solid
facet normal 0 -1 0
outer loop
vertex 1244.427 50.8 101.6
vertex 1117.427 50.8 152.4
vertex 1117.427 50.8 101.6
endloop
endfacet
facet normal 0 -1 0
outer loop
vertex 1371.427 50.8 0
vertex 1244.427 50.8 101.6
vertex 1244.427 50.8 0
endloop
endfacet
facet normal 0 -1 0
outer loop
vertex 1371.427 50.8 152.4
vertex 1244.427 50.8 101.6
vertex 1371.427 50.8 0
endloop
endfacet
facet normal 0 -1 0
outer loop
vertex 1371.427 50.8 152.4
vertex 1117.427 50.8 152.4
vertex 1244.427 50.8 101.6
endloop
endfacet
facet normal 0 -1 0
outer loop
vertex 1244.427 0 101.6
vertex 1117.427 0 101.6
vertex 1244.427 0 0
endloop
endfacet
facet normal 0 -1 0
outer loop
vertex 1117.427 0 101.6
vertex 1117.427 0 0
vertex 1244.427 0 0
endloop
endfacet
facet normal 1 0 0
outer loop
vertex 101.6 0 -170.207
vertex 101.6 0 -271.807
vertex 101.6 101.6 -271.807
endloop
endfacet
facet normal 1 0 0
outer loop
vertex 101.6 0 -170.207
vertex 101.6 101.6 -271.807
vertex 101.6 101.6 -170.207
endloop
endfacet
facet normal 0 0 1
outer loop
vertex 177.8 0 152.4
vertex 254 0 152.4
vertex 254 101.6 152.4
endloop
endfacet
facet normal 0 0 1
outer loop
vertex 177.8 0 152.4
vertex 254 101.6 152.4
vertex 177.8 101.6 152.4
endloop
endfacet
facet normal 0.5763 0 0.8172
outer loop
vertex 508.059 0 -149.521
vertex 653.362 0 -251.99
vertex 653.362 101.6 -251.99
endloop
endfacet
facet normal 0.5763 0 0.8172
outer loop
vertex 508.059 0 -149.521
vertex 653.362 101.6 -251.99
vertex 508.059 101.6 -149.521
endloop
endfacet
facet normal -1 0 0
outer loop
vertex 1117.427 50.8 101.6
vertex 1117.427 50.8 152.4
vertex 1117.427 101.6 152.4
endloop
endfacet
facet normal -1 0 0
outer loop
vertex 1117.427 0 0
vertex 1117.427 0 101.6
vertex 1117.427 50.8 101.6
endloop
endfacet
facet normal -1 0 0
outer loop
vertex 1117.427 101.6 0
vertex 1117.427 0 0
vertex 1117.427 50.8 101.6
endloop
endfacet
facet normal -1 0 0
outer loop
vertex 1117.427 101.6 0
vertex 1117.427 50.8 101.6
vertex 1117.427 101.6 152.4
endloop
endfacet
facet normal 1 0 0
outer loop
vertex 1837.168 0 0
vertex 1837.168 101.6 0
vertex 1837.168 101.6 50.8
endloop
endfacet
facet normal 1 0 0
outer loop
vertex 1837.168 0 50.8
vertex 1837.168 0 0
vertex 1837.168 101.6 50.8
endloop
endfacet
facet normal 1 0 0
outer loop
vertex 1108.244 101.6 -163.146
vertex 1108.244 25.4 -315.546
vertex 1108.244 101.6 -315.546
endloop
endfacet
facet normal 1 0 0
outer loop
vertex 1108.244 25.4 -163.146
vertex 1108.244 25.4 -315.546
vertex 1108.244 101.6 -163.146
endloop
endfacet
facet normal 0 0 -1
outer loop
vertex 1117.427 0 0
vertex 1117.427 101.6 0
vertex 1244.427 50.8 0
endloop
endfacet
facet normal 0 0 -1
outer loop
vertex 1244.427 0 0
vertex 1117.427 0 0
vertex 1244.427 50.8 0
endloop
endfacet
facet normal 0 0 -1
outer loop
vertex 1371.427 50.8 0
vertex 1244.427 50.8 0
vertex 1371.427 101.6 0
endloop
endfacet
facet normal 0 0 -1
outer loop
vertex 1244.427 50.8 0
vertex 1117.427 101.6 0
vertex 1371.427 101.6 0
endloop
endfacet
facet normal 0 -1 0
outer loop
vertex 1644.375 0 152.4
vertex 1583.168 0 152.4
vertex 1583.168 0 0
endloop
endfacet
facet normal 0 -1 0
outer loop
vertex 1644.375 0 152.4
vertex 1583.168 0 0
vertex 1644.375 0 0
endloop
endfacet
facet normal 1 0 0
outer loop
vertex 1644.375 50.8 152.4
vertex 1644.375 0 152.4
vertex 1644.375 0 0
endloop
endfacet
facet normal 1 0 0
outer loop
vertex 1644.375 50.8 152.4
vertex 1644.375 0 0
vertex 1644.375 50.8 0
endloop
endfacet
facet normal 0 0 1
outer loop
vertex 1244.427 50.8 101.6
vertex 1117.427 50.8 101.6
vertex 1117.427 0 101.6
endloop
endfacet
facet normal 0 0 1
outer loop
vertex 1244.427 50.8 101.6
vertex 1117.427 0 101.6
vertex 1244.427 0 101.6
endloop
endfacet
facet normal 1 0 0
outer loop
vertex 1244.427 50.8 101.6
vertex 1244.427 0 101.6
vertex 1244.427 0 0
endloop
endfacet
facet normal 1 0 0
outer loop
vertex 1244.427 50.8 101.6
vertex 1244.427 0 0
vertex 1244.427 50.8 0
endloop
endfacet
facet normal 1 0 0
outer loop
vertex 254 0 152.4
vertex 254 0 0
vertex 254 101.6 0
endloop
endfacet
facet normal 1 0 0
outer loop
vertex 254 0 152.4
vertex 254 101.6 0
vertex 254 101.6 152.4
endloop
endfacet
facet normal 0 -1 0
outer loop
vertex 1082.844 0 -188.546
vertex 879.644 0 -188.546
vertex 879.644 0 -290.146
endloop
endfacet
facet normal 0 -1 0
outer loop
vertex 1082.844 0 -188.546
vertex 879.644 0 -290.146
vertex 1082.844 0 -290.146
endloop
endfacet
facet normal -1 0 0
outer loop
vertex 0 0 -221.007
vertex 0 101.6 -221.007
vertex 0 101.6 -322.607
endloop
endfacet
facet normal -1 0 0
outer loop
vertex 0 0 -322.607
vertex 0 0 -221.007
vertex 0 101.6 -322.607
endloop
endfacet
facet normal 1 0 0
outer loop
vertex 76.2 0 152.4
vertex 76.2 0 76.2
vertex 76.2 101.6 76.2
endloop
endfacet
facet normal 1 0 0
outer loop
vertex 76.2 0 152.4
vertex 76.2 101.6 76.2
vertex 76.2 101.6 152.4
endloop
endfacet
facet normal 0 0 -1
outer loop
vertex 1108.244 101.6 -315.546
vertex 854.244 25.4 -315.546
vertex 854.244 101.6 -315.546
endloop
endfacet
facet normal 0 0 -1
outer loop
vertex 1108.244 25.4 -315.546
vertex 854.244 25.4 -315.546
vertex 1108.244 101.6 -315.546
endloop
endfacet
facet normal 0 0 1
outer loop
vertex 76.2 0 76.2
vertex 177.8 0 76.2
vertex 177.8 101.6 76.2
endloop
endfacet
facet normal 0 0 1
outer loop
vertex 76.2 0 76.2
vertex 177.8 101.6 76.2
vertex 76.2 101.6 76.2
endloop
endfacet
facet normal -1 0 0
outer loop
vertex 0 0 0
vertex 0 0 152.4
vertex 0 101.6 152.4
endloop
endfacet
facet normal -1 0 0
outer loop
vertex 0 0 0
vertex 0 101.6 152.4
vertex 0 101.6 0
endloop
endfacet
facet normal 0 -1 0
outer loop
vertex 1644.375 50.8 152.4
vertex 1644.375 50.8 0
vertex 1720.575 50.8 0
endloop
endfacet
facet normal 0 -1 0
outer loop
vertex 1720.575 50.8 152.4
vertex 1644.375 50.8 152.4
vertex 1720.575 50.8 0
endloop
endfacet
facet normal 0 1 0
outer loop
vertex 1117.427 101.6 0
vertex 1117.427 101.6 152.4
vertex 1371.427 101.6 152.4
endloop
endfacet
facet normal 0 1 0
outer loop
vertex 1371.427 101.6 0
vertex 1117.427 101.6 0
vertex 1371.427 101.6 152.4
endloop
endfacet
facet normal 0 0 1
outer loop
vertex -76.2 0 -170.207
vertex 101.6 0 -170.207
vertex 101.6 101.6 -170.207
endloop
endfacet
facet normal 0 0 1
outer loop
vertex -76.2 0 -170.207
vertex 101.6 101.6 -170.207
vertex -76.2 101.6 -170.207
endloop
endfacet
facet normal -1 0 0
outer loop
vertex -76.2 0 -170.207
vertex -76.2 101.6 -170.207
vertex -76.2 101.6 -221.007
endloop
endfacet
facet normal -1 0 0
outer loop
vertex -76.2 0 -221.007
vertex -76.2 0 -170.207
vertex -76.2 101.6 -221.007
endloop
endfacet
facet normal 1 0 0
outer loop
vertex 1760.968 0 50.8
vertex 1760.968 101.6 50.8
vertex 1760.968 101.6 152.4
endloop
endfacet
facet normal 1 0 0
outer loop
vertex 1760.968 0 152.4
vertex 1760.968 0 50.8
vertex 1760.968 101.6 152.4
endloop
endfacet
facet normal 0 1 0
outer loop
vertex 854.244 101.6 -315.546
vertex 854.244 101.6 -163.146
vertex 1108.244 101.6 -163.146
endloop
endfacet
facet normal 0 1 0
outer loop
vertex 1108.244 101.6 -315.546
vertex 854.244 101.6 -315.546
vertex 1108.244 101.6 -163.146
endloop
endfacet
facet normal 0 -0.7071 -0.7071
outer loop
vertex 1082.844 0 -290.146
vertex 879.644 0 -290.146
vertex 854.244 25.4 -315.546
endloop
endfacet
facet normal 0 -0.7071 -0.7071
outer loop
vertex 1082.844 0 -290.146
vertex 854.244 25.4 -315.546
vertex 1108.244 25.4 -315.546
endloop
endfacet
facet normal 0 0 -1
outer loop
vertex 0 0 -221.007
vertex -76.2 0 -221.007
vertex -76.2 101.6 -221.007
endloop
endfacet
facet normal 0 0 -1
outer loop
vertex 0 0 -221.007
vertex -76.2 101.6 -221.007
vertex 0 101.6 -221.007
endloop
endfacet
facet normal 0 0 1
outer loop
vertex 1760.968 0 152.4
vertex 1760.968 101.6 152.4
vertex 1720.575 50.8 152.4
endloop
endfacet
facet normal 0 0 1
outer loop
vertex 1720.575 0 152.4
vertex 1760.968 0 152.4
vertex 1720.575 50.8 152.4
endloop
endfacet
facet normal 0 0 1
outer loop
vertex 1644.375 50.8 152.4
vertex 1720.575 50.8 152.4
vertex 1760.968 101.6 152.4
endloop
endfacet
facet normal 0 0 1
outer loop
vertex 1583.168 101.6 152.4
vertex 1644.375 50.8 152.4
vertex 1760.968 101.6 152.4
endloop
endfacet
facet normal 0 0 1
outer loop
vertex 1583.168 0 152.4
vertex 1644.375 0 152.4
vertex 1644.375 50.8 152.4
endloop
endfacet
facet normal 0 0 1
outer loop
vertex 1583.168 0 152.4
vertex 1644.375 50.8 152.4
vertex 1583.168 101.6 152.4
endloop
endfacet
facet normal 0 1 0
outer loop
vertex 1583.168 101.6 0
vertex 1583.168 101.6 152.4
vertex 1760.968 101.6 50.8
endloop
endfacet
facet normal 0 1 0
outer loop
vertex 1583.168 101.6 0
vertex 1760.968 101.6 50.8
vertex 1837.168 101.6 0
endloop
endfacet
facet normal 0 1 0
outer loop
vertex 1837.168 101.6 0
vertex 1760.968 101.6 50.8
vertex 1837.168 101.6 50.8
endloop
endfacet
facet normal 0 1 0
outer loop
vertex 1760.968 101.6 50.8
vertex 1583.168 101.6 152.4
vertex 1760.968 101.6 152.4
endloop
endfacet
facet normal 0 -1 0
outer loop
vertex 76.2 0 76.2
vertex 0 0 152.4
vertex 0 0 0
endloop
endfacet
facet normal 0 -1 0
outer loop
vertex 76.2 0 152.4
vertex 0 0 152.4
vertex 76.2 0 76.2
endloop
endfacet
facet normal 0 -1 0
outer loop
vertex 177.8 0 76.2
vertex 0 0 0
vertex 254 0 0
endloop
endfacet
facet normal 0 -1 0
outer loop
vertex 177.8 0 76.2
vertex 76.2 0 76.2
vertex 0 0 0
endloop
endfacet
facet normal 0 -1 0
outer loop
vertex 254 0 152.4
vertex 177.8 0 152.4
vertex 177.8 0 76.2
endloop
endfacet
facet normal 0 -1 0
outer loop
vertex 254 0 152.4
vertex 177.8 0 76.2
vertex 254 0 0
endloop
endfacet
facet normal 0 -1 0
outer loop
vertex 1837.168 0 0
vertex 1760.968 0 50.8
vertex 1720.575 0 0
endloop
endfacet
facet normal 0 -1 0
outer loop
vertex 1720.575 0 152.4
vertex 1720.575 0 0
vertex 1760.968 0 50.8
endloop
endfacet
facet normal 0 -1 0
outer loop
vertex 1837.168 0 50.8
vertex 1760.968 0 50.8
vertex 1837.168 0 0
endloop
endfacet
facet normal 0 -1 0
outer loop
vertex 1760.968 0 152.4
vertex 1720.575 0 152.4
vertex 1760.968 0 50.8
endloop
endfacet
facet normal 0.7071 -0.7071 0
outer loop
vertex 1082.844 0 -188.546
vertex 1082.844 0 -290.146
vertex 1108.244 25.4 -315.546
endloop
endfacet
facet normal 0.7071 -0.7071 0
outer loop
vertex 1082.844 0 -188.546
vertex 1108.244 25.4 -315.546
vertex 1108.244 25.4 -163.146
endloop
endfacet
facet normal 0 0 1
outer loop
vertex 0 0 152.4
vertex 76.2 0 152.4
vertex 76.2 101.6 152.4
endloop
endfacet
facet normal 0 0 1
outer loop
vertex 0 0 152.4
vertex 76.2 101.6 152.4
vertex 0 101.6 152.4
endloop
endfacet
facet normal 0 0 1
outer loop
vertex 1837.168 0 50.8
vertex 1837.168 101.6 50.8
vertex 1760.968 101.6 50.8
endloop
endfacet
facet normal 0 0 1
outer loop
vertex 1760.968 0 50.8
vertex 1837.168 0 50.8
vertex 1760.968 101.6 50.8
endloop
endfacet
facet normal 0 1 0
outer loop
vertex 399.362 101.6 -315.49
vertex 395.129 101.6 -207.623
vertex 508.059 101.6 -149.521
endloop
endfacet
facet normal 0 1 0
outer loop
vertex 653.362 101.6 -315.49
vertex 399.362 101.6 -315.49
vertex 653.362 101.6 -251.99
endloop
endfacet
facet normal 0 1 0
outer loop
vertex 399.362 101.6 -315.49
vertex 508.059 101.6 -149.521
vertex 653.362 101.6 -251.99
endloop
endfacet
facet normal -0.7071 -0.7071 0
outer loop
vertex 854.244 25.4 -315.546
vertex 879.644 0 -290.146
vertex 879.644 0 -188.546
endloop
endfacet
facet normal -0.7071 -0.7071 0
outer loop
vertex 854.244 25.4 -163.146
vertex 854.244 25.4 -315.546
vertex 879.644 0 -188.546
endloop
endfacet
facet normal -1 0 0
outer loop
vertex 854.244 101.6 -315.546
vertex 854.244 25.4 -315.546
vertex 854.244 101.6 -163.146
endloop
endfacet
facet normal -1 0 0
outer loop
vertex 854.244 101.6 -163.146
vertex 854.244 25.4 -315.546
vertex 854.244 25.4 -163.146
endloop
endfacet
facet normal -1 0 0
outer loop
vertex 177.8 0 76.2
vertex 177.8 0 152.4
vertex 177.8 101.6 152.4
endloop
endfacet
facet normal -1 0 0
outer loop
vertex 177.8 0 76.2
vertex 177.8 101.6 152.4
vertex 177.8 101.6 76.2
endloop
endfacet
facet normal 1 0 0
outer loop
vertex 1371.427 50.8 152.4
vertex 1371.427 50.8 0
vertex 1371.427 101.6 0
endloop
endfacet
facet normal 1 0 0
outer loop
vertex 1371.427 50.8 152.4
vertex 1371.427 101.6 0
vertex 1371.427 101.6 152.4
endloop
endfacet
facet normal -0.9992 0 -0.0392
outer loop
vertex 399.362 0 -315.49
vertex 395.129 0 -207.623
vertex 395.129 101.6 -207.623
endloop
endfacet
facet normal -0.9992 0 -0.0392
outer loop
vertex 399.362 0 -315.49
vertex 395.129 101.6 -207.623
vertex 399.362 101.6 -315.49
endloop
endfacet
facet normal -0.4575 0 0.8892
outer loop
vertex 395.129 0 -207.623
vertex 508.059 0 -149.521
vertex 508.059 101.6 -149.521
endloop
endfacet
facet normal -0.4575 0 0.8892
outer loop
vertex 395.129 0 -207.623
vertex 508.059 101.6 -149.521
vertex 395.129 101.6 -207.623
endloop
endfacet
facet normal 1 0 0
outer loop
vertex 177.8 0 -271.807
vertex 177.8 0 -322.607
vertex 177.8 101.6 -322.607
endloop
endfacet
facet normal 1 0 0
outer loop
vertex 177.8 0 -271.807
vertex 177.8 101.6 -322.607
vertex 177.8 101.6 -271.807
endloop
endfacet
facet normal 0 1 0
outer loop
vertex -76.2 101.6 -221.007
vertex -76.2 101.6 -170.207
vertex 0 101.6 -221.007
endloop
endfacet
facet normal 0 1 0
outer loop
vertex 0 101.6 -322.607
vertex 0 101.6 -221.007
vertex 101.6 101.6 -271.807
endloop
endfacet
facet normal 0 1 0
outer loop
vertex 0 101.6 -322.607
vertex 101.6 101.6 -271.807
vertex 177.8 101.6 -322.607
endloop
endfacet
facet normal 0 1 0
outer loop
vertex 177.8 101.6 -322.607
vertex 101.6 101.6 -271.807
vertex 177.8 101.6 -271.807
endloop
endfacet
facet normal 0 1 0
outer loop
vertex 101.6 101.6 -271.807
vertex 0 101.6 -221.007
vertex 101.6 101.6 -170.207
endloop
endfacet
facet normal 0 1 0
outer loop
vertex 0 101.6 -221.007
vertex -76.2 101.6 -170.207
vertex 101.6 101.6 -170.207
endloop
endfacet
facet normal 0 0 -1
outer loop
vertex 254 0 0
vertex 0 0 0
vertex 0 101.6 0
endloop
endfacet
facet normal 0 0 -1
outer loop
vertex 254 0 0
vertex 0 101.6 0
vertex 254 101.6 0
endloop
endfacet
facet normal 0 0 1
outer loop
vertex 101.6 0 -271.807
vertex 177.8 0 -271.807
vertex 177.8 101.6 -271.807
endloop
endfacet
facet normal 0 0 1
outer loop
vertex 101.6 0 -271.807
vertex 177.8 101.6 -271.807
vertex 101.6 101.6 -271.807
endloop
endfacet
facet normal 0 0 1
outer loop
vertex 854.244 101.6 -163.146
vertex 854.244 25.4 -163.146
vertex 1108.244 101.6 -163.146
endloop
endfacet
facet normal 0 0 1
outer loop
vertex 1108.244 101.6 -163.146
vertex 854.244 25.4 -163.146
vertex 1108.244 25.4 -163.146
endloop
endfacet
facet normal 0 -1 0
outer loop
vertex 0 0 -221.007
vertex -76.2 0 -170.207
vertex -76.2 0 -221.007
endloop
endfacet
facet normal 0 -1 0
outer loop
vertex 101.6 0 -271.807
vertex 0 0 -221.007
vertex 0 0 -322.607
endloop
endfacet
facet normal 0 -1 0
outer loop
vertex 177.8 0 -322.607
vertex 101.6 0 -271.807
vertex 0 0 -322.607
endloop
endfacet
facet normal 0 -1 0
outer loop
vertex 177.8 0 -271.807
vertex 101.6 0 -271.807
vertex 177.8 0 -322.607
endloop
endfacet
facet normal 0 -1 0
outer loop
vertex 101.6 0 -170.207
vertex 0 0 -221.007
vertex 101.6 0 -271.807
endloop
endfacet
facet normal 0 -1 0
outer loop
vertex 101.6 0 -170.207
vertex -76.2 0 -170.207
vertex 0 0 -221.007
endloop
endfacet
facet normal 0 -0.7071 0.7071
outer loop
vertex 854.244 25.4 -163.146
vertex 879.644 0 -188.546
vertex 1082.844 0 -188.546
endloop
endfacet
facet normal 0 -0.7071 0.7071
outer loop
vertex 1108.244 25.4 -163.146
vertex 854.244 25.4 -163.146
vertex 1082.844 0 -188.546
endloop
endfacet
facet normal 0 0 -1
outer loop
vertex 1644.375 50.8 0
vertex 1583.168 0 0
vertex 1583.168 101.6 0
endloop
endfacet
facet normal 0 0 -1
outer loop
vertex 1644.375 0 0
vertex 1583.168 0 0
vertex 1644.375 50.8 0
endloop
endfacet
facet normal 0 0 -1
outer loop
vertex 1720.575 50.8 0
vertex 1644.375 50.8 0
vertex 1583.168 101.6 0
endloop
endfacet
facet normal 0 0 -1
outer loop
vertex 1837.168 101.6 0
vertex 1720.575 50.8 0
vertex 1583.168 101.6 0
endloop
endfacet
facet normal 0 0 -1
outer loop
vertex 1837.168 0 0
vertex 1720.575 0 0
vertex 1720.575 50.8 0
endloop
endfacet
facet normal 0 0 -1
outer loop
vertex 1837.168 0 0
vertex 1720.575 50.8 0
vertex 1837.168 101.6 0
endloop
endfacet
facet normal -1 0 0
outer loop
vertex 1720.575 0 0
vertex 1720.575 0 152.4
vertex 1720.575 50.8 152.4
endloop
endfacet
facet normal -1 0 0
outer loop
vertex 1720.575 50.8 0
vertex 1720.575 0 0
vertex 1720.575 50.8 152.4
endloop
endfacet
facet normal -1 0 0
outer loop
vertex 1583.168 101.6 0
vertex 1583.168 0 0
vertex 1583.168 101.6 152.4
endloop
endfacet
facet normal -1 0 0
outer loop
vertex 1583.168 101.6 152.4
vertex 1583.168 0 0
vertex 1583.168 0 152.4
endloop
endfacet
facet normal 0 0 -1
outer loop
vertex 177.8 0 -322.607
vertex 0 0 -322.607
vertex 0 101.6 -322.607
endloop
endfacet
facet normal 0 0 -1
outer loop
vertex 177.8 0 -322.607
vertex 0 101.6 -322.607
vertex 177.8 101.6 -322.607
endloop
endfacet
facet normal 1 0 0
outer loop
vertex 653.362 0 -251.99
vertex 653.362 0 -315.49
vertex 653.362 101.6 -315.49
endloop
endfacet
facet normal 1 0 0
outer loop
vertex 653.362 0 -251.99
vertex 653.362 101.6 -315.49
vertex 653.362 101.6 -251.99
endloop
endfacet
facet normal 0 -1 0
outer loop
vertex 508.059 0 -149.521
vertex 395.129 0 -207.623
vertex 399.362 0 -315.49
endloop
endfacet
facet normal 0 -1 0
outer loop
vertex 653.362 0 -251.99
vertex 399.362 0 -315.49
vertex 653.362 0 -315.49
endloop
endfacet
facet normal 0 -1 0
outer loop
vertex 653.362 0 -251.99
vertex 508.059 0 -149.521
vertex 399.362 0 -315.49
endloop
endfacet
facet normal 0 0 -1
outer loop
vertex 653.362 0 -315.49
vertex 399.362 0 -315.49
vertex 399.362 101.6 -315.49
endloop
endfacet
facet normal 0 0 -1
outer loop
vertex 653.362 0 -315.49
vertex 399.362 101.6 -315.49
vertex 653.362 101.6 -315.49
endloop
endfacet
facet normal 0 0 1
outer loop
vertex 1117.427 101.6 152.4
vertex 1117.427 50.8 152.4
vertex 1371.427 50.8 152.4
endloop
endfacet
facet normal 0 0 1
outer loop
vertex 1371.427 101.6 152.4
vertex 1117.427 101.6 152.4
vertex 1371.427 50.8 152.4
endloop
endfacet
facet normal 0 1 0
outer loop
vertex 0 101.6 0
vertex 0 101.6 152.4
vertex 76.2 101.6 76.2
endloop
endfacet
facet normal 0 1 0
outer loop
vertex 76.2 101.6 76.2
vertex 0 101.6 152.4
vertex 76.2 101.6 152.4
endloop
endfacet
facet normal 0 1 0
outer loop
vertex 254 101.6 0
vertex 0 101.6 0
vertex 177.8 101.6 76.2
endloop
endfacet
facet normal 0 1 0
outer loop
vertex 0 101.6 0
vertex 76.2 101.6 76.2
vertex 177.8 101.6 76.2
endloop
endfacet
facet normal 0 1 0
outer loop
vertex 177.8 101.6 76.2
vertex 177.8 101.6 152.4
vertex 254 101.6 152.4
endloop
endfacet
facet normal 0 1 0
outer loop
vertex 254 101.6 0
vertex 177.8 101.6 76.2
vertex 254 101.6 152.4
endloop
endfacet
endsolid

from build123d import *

# Parameters (mm, degrees)
F1_DEPTH   = 101.6
F2_W       = 254
F2_H       = 152.4
F3_DEPTH   = 101.6
F4_W       = 127
F4_H       = 76.2
F5_DEPTH   = 50.8
F5_FACE_W  = 127
F5_FACE_H  = 76.2
F6_DEPTH   = 50.8
F7_DEPTH   = 50.8
F8_DEPTH   = 50.8
F10_DEPTH  = 50.8
F10_FACE_W = 127
F10_FACE_H = 50.8
F11_DEPTH  = 25.4
F12_W      = 50.8
F12_H      = 152.4
F13_DEPTH  = 50.8
F14_DEPTH  = 101.6
F15_W      = 76.2
F15_H      = 50.8
F16_DEPTH  = 152.4
F18_DEPTH  = 101.6
F20_DEPTH  = 101.6
F21_W      = 254
F21_H      = 152.4
F22_DEPTH  = 101.6
F23_SIZE   = 25.4


with BuildPart() as f1:
    # F0 (on Front) → F1 (new body)
    with BuildSketch(Plane.XZ):
        Polygon((0, 152.4), (0, 0), (254, 0), (254, 152.4), (177.8, 152.4), (177.8, 76.2), (76.2, 76.2), (76.2, 152.4), align=None)
    extrude(amount=-F1_DEPTH)


with BuildPart() as f3:
    # F2 (on Front) → F3 (new body)
    with BuildSketch(Plane.XZ):
        with Locations((1244.426706, 76.2)):
            Rectangle(F2_W, F2_H)
    extrude(amount=-F3_DEPTH)

    # F4 (on face) → F5 (join)
    with BuildSketch(Plane.XZ):
        with Locations((1180.926706, 38.1)):
            Rectangle(F4_W, F4_H)
    extrude(amount=F5_DEPTH)

    # F5_face (on face) → F6 (join)
    with BuildSketch(Plane(origin=(1180.926706, -50.8, 38.1), x_dir=(1, 0, 0), z_dir=(0, -1, 0))):
        Rectangle(F5_FACE_W, F5_FACE_H)
    extrude(amount=-F6_DEPTH)

    # F5_face (on face) → F7 (join)
    with BuildSketch(Plane(origin=(1180.926706, -50.8, 38.1), x_dir=(1, 0, 0), z_dir=(0, -1, 0))):
        Rectangle(F5_FACE_W, F5_FACE_H)
    extrude(amount=-F7_DEPTH)

    # F5_face (on face) → F8 (cut)
    with BuildSketch(Plane(origin=(1180.926706, -50.8, 38.1), x_dir=(1, 0, 0), z_dir=(0, -1, 0))):
        Rectangle(F5_FACE_W, F5_FACE_H)
    extrude(amount=-F8_DEPTH, mode=Mode.SUBTRACT)

    # F9 (on face) → F10 (cut)
    with BuildSketch(Plane.XZ):
        Polygon((1117.426706, 152.4), (1117.426706, 76.2), (1244.426706, 76.2), (1244.426706, 0), (1371.426706, 0), (1371.426706, 152.4), align=None)
    extrude(amount=-F10_DEPTH, mode=Mode.SUBTRACT)

    # F10_face (on face) → F11 (join)
    with BuildSketch(Plane(origin=(1180.926706, 25.4, 76.2), x_dir=(1, 0, 0), z_dir=(0, 0, 1))):
        Rectangle(F10_FACE_W, F10_FACE_H)
    extrude(amount=F11_DEPTH)


with BuildPart() as f13:
    # F12 (on Front) → F13 (new body)
    with BuildSketch(Plane.XZ):
        Polygon((1760.967876, 152.4), (1633.967876, 152.4), (1633.967876, 0), (1837.167876, 0), (1837.167876, 50.8), (1760.967876, 50.8), align=None)
        with Locations((1608.567876, 76.2)):
            Rectangle(F12_W, F12_H)
    extrude(amount=-F13_DEPTH)

    # F13_face (on face) → F14 (join)
    with BuildSketch(Plane(origin=(1687.942876, 0, 69.85), x_dir=(1, 0, 0), z_dir=(0, -1, 0))):
        Polygon((73.025, 82.55), (-104.775, 82.55), (-104.775, -69.85), (149.225, -69.85), (149.225, -19.05), (73.025, -19.05), align=None)
    extrude(amount=-F14_DEPTH)

    # F15 (on face) → F16 (cut)
    with BuildSketch(Plane.XY.offset(152.4)):
        with Locations((1682.475205, 25.4)):
            Rectangle(F15_W, F15_H)
    extrude(amount=-F16_DEPTH, mode=Mode.SUBTRACT)


with BuildPart() as f18:
    # F17 (on Front) → F18 (new body)
    with BuildSketch(Plane.XZ):
        Polygon((0, -221.006861), (0, -322.606861), (177.8, -322.606861), (177.8, -271.806861), (101.6, -271.806861), (101.6, -170.206861), (-76.2, -170.206861), (-76.2, -221.006861), align=None)
    extrude(amount=-F18_DEPTH)


with BuildPart() as f20:
    # F19 (on Front) → F20 (new body)
    with BuildSketch(Plane.XZ):
        Polygon((395.12906, -207.62306), (399.361687, -315.490049), (653.361687, -315.490049), (653.361687, -251.990049), (508.058856, -149.520897), align=None)
    extrude(amount=-F20_DEPTH)


with BuildPart() as f22:
    # F21 (on Front) → F22 (new body)
    with BuildSketch(Plane.XZ):
        with Locations((981.243871, -239.345616)):
            Rectangle(F21_W, F21_H)
    extrude(amount=-F22_DEPTH)

    # F23
    f23_edges = [f22.edges().sort_by_distance(p)[0] for p in [
        (854.243871, 0, -239.345616),
        (981.243871, 0, -315.545616),
        (1108.243871, 0, -239.345616),
        (981.243871, 0, -163.145616),
    ]]
    chamfer(f23_edges, length=F23_SIZE)


solid = Compound([f1.part, f3.part, f13.part, f18.part, f20.part, f22.part])
